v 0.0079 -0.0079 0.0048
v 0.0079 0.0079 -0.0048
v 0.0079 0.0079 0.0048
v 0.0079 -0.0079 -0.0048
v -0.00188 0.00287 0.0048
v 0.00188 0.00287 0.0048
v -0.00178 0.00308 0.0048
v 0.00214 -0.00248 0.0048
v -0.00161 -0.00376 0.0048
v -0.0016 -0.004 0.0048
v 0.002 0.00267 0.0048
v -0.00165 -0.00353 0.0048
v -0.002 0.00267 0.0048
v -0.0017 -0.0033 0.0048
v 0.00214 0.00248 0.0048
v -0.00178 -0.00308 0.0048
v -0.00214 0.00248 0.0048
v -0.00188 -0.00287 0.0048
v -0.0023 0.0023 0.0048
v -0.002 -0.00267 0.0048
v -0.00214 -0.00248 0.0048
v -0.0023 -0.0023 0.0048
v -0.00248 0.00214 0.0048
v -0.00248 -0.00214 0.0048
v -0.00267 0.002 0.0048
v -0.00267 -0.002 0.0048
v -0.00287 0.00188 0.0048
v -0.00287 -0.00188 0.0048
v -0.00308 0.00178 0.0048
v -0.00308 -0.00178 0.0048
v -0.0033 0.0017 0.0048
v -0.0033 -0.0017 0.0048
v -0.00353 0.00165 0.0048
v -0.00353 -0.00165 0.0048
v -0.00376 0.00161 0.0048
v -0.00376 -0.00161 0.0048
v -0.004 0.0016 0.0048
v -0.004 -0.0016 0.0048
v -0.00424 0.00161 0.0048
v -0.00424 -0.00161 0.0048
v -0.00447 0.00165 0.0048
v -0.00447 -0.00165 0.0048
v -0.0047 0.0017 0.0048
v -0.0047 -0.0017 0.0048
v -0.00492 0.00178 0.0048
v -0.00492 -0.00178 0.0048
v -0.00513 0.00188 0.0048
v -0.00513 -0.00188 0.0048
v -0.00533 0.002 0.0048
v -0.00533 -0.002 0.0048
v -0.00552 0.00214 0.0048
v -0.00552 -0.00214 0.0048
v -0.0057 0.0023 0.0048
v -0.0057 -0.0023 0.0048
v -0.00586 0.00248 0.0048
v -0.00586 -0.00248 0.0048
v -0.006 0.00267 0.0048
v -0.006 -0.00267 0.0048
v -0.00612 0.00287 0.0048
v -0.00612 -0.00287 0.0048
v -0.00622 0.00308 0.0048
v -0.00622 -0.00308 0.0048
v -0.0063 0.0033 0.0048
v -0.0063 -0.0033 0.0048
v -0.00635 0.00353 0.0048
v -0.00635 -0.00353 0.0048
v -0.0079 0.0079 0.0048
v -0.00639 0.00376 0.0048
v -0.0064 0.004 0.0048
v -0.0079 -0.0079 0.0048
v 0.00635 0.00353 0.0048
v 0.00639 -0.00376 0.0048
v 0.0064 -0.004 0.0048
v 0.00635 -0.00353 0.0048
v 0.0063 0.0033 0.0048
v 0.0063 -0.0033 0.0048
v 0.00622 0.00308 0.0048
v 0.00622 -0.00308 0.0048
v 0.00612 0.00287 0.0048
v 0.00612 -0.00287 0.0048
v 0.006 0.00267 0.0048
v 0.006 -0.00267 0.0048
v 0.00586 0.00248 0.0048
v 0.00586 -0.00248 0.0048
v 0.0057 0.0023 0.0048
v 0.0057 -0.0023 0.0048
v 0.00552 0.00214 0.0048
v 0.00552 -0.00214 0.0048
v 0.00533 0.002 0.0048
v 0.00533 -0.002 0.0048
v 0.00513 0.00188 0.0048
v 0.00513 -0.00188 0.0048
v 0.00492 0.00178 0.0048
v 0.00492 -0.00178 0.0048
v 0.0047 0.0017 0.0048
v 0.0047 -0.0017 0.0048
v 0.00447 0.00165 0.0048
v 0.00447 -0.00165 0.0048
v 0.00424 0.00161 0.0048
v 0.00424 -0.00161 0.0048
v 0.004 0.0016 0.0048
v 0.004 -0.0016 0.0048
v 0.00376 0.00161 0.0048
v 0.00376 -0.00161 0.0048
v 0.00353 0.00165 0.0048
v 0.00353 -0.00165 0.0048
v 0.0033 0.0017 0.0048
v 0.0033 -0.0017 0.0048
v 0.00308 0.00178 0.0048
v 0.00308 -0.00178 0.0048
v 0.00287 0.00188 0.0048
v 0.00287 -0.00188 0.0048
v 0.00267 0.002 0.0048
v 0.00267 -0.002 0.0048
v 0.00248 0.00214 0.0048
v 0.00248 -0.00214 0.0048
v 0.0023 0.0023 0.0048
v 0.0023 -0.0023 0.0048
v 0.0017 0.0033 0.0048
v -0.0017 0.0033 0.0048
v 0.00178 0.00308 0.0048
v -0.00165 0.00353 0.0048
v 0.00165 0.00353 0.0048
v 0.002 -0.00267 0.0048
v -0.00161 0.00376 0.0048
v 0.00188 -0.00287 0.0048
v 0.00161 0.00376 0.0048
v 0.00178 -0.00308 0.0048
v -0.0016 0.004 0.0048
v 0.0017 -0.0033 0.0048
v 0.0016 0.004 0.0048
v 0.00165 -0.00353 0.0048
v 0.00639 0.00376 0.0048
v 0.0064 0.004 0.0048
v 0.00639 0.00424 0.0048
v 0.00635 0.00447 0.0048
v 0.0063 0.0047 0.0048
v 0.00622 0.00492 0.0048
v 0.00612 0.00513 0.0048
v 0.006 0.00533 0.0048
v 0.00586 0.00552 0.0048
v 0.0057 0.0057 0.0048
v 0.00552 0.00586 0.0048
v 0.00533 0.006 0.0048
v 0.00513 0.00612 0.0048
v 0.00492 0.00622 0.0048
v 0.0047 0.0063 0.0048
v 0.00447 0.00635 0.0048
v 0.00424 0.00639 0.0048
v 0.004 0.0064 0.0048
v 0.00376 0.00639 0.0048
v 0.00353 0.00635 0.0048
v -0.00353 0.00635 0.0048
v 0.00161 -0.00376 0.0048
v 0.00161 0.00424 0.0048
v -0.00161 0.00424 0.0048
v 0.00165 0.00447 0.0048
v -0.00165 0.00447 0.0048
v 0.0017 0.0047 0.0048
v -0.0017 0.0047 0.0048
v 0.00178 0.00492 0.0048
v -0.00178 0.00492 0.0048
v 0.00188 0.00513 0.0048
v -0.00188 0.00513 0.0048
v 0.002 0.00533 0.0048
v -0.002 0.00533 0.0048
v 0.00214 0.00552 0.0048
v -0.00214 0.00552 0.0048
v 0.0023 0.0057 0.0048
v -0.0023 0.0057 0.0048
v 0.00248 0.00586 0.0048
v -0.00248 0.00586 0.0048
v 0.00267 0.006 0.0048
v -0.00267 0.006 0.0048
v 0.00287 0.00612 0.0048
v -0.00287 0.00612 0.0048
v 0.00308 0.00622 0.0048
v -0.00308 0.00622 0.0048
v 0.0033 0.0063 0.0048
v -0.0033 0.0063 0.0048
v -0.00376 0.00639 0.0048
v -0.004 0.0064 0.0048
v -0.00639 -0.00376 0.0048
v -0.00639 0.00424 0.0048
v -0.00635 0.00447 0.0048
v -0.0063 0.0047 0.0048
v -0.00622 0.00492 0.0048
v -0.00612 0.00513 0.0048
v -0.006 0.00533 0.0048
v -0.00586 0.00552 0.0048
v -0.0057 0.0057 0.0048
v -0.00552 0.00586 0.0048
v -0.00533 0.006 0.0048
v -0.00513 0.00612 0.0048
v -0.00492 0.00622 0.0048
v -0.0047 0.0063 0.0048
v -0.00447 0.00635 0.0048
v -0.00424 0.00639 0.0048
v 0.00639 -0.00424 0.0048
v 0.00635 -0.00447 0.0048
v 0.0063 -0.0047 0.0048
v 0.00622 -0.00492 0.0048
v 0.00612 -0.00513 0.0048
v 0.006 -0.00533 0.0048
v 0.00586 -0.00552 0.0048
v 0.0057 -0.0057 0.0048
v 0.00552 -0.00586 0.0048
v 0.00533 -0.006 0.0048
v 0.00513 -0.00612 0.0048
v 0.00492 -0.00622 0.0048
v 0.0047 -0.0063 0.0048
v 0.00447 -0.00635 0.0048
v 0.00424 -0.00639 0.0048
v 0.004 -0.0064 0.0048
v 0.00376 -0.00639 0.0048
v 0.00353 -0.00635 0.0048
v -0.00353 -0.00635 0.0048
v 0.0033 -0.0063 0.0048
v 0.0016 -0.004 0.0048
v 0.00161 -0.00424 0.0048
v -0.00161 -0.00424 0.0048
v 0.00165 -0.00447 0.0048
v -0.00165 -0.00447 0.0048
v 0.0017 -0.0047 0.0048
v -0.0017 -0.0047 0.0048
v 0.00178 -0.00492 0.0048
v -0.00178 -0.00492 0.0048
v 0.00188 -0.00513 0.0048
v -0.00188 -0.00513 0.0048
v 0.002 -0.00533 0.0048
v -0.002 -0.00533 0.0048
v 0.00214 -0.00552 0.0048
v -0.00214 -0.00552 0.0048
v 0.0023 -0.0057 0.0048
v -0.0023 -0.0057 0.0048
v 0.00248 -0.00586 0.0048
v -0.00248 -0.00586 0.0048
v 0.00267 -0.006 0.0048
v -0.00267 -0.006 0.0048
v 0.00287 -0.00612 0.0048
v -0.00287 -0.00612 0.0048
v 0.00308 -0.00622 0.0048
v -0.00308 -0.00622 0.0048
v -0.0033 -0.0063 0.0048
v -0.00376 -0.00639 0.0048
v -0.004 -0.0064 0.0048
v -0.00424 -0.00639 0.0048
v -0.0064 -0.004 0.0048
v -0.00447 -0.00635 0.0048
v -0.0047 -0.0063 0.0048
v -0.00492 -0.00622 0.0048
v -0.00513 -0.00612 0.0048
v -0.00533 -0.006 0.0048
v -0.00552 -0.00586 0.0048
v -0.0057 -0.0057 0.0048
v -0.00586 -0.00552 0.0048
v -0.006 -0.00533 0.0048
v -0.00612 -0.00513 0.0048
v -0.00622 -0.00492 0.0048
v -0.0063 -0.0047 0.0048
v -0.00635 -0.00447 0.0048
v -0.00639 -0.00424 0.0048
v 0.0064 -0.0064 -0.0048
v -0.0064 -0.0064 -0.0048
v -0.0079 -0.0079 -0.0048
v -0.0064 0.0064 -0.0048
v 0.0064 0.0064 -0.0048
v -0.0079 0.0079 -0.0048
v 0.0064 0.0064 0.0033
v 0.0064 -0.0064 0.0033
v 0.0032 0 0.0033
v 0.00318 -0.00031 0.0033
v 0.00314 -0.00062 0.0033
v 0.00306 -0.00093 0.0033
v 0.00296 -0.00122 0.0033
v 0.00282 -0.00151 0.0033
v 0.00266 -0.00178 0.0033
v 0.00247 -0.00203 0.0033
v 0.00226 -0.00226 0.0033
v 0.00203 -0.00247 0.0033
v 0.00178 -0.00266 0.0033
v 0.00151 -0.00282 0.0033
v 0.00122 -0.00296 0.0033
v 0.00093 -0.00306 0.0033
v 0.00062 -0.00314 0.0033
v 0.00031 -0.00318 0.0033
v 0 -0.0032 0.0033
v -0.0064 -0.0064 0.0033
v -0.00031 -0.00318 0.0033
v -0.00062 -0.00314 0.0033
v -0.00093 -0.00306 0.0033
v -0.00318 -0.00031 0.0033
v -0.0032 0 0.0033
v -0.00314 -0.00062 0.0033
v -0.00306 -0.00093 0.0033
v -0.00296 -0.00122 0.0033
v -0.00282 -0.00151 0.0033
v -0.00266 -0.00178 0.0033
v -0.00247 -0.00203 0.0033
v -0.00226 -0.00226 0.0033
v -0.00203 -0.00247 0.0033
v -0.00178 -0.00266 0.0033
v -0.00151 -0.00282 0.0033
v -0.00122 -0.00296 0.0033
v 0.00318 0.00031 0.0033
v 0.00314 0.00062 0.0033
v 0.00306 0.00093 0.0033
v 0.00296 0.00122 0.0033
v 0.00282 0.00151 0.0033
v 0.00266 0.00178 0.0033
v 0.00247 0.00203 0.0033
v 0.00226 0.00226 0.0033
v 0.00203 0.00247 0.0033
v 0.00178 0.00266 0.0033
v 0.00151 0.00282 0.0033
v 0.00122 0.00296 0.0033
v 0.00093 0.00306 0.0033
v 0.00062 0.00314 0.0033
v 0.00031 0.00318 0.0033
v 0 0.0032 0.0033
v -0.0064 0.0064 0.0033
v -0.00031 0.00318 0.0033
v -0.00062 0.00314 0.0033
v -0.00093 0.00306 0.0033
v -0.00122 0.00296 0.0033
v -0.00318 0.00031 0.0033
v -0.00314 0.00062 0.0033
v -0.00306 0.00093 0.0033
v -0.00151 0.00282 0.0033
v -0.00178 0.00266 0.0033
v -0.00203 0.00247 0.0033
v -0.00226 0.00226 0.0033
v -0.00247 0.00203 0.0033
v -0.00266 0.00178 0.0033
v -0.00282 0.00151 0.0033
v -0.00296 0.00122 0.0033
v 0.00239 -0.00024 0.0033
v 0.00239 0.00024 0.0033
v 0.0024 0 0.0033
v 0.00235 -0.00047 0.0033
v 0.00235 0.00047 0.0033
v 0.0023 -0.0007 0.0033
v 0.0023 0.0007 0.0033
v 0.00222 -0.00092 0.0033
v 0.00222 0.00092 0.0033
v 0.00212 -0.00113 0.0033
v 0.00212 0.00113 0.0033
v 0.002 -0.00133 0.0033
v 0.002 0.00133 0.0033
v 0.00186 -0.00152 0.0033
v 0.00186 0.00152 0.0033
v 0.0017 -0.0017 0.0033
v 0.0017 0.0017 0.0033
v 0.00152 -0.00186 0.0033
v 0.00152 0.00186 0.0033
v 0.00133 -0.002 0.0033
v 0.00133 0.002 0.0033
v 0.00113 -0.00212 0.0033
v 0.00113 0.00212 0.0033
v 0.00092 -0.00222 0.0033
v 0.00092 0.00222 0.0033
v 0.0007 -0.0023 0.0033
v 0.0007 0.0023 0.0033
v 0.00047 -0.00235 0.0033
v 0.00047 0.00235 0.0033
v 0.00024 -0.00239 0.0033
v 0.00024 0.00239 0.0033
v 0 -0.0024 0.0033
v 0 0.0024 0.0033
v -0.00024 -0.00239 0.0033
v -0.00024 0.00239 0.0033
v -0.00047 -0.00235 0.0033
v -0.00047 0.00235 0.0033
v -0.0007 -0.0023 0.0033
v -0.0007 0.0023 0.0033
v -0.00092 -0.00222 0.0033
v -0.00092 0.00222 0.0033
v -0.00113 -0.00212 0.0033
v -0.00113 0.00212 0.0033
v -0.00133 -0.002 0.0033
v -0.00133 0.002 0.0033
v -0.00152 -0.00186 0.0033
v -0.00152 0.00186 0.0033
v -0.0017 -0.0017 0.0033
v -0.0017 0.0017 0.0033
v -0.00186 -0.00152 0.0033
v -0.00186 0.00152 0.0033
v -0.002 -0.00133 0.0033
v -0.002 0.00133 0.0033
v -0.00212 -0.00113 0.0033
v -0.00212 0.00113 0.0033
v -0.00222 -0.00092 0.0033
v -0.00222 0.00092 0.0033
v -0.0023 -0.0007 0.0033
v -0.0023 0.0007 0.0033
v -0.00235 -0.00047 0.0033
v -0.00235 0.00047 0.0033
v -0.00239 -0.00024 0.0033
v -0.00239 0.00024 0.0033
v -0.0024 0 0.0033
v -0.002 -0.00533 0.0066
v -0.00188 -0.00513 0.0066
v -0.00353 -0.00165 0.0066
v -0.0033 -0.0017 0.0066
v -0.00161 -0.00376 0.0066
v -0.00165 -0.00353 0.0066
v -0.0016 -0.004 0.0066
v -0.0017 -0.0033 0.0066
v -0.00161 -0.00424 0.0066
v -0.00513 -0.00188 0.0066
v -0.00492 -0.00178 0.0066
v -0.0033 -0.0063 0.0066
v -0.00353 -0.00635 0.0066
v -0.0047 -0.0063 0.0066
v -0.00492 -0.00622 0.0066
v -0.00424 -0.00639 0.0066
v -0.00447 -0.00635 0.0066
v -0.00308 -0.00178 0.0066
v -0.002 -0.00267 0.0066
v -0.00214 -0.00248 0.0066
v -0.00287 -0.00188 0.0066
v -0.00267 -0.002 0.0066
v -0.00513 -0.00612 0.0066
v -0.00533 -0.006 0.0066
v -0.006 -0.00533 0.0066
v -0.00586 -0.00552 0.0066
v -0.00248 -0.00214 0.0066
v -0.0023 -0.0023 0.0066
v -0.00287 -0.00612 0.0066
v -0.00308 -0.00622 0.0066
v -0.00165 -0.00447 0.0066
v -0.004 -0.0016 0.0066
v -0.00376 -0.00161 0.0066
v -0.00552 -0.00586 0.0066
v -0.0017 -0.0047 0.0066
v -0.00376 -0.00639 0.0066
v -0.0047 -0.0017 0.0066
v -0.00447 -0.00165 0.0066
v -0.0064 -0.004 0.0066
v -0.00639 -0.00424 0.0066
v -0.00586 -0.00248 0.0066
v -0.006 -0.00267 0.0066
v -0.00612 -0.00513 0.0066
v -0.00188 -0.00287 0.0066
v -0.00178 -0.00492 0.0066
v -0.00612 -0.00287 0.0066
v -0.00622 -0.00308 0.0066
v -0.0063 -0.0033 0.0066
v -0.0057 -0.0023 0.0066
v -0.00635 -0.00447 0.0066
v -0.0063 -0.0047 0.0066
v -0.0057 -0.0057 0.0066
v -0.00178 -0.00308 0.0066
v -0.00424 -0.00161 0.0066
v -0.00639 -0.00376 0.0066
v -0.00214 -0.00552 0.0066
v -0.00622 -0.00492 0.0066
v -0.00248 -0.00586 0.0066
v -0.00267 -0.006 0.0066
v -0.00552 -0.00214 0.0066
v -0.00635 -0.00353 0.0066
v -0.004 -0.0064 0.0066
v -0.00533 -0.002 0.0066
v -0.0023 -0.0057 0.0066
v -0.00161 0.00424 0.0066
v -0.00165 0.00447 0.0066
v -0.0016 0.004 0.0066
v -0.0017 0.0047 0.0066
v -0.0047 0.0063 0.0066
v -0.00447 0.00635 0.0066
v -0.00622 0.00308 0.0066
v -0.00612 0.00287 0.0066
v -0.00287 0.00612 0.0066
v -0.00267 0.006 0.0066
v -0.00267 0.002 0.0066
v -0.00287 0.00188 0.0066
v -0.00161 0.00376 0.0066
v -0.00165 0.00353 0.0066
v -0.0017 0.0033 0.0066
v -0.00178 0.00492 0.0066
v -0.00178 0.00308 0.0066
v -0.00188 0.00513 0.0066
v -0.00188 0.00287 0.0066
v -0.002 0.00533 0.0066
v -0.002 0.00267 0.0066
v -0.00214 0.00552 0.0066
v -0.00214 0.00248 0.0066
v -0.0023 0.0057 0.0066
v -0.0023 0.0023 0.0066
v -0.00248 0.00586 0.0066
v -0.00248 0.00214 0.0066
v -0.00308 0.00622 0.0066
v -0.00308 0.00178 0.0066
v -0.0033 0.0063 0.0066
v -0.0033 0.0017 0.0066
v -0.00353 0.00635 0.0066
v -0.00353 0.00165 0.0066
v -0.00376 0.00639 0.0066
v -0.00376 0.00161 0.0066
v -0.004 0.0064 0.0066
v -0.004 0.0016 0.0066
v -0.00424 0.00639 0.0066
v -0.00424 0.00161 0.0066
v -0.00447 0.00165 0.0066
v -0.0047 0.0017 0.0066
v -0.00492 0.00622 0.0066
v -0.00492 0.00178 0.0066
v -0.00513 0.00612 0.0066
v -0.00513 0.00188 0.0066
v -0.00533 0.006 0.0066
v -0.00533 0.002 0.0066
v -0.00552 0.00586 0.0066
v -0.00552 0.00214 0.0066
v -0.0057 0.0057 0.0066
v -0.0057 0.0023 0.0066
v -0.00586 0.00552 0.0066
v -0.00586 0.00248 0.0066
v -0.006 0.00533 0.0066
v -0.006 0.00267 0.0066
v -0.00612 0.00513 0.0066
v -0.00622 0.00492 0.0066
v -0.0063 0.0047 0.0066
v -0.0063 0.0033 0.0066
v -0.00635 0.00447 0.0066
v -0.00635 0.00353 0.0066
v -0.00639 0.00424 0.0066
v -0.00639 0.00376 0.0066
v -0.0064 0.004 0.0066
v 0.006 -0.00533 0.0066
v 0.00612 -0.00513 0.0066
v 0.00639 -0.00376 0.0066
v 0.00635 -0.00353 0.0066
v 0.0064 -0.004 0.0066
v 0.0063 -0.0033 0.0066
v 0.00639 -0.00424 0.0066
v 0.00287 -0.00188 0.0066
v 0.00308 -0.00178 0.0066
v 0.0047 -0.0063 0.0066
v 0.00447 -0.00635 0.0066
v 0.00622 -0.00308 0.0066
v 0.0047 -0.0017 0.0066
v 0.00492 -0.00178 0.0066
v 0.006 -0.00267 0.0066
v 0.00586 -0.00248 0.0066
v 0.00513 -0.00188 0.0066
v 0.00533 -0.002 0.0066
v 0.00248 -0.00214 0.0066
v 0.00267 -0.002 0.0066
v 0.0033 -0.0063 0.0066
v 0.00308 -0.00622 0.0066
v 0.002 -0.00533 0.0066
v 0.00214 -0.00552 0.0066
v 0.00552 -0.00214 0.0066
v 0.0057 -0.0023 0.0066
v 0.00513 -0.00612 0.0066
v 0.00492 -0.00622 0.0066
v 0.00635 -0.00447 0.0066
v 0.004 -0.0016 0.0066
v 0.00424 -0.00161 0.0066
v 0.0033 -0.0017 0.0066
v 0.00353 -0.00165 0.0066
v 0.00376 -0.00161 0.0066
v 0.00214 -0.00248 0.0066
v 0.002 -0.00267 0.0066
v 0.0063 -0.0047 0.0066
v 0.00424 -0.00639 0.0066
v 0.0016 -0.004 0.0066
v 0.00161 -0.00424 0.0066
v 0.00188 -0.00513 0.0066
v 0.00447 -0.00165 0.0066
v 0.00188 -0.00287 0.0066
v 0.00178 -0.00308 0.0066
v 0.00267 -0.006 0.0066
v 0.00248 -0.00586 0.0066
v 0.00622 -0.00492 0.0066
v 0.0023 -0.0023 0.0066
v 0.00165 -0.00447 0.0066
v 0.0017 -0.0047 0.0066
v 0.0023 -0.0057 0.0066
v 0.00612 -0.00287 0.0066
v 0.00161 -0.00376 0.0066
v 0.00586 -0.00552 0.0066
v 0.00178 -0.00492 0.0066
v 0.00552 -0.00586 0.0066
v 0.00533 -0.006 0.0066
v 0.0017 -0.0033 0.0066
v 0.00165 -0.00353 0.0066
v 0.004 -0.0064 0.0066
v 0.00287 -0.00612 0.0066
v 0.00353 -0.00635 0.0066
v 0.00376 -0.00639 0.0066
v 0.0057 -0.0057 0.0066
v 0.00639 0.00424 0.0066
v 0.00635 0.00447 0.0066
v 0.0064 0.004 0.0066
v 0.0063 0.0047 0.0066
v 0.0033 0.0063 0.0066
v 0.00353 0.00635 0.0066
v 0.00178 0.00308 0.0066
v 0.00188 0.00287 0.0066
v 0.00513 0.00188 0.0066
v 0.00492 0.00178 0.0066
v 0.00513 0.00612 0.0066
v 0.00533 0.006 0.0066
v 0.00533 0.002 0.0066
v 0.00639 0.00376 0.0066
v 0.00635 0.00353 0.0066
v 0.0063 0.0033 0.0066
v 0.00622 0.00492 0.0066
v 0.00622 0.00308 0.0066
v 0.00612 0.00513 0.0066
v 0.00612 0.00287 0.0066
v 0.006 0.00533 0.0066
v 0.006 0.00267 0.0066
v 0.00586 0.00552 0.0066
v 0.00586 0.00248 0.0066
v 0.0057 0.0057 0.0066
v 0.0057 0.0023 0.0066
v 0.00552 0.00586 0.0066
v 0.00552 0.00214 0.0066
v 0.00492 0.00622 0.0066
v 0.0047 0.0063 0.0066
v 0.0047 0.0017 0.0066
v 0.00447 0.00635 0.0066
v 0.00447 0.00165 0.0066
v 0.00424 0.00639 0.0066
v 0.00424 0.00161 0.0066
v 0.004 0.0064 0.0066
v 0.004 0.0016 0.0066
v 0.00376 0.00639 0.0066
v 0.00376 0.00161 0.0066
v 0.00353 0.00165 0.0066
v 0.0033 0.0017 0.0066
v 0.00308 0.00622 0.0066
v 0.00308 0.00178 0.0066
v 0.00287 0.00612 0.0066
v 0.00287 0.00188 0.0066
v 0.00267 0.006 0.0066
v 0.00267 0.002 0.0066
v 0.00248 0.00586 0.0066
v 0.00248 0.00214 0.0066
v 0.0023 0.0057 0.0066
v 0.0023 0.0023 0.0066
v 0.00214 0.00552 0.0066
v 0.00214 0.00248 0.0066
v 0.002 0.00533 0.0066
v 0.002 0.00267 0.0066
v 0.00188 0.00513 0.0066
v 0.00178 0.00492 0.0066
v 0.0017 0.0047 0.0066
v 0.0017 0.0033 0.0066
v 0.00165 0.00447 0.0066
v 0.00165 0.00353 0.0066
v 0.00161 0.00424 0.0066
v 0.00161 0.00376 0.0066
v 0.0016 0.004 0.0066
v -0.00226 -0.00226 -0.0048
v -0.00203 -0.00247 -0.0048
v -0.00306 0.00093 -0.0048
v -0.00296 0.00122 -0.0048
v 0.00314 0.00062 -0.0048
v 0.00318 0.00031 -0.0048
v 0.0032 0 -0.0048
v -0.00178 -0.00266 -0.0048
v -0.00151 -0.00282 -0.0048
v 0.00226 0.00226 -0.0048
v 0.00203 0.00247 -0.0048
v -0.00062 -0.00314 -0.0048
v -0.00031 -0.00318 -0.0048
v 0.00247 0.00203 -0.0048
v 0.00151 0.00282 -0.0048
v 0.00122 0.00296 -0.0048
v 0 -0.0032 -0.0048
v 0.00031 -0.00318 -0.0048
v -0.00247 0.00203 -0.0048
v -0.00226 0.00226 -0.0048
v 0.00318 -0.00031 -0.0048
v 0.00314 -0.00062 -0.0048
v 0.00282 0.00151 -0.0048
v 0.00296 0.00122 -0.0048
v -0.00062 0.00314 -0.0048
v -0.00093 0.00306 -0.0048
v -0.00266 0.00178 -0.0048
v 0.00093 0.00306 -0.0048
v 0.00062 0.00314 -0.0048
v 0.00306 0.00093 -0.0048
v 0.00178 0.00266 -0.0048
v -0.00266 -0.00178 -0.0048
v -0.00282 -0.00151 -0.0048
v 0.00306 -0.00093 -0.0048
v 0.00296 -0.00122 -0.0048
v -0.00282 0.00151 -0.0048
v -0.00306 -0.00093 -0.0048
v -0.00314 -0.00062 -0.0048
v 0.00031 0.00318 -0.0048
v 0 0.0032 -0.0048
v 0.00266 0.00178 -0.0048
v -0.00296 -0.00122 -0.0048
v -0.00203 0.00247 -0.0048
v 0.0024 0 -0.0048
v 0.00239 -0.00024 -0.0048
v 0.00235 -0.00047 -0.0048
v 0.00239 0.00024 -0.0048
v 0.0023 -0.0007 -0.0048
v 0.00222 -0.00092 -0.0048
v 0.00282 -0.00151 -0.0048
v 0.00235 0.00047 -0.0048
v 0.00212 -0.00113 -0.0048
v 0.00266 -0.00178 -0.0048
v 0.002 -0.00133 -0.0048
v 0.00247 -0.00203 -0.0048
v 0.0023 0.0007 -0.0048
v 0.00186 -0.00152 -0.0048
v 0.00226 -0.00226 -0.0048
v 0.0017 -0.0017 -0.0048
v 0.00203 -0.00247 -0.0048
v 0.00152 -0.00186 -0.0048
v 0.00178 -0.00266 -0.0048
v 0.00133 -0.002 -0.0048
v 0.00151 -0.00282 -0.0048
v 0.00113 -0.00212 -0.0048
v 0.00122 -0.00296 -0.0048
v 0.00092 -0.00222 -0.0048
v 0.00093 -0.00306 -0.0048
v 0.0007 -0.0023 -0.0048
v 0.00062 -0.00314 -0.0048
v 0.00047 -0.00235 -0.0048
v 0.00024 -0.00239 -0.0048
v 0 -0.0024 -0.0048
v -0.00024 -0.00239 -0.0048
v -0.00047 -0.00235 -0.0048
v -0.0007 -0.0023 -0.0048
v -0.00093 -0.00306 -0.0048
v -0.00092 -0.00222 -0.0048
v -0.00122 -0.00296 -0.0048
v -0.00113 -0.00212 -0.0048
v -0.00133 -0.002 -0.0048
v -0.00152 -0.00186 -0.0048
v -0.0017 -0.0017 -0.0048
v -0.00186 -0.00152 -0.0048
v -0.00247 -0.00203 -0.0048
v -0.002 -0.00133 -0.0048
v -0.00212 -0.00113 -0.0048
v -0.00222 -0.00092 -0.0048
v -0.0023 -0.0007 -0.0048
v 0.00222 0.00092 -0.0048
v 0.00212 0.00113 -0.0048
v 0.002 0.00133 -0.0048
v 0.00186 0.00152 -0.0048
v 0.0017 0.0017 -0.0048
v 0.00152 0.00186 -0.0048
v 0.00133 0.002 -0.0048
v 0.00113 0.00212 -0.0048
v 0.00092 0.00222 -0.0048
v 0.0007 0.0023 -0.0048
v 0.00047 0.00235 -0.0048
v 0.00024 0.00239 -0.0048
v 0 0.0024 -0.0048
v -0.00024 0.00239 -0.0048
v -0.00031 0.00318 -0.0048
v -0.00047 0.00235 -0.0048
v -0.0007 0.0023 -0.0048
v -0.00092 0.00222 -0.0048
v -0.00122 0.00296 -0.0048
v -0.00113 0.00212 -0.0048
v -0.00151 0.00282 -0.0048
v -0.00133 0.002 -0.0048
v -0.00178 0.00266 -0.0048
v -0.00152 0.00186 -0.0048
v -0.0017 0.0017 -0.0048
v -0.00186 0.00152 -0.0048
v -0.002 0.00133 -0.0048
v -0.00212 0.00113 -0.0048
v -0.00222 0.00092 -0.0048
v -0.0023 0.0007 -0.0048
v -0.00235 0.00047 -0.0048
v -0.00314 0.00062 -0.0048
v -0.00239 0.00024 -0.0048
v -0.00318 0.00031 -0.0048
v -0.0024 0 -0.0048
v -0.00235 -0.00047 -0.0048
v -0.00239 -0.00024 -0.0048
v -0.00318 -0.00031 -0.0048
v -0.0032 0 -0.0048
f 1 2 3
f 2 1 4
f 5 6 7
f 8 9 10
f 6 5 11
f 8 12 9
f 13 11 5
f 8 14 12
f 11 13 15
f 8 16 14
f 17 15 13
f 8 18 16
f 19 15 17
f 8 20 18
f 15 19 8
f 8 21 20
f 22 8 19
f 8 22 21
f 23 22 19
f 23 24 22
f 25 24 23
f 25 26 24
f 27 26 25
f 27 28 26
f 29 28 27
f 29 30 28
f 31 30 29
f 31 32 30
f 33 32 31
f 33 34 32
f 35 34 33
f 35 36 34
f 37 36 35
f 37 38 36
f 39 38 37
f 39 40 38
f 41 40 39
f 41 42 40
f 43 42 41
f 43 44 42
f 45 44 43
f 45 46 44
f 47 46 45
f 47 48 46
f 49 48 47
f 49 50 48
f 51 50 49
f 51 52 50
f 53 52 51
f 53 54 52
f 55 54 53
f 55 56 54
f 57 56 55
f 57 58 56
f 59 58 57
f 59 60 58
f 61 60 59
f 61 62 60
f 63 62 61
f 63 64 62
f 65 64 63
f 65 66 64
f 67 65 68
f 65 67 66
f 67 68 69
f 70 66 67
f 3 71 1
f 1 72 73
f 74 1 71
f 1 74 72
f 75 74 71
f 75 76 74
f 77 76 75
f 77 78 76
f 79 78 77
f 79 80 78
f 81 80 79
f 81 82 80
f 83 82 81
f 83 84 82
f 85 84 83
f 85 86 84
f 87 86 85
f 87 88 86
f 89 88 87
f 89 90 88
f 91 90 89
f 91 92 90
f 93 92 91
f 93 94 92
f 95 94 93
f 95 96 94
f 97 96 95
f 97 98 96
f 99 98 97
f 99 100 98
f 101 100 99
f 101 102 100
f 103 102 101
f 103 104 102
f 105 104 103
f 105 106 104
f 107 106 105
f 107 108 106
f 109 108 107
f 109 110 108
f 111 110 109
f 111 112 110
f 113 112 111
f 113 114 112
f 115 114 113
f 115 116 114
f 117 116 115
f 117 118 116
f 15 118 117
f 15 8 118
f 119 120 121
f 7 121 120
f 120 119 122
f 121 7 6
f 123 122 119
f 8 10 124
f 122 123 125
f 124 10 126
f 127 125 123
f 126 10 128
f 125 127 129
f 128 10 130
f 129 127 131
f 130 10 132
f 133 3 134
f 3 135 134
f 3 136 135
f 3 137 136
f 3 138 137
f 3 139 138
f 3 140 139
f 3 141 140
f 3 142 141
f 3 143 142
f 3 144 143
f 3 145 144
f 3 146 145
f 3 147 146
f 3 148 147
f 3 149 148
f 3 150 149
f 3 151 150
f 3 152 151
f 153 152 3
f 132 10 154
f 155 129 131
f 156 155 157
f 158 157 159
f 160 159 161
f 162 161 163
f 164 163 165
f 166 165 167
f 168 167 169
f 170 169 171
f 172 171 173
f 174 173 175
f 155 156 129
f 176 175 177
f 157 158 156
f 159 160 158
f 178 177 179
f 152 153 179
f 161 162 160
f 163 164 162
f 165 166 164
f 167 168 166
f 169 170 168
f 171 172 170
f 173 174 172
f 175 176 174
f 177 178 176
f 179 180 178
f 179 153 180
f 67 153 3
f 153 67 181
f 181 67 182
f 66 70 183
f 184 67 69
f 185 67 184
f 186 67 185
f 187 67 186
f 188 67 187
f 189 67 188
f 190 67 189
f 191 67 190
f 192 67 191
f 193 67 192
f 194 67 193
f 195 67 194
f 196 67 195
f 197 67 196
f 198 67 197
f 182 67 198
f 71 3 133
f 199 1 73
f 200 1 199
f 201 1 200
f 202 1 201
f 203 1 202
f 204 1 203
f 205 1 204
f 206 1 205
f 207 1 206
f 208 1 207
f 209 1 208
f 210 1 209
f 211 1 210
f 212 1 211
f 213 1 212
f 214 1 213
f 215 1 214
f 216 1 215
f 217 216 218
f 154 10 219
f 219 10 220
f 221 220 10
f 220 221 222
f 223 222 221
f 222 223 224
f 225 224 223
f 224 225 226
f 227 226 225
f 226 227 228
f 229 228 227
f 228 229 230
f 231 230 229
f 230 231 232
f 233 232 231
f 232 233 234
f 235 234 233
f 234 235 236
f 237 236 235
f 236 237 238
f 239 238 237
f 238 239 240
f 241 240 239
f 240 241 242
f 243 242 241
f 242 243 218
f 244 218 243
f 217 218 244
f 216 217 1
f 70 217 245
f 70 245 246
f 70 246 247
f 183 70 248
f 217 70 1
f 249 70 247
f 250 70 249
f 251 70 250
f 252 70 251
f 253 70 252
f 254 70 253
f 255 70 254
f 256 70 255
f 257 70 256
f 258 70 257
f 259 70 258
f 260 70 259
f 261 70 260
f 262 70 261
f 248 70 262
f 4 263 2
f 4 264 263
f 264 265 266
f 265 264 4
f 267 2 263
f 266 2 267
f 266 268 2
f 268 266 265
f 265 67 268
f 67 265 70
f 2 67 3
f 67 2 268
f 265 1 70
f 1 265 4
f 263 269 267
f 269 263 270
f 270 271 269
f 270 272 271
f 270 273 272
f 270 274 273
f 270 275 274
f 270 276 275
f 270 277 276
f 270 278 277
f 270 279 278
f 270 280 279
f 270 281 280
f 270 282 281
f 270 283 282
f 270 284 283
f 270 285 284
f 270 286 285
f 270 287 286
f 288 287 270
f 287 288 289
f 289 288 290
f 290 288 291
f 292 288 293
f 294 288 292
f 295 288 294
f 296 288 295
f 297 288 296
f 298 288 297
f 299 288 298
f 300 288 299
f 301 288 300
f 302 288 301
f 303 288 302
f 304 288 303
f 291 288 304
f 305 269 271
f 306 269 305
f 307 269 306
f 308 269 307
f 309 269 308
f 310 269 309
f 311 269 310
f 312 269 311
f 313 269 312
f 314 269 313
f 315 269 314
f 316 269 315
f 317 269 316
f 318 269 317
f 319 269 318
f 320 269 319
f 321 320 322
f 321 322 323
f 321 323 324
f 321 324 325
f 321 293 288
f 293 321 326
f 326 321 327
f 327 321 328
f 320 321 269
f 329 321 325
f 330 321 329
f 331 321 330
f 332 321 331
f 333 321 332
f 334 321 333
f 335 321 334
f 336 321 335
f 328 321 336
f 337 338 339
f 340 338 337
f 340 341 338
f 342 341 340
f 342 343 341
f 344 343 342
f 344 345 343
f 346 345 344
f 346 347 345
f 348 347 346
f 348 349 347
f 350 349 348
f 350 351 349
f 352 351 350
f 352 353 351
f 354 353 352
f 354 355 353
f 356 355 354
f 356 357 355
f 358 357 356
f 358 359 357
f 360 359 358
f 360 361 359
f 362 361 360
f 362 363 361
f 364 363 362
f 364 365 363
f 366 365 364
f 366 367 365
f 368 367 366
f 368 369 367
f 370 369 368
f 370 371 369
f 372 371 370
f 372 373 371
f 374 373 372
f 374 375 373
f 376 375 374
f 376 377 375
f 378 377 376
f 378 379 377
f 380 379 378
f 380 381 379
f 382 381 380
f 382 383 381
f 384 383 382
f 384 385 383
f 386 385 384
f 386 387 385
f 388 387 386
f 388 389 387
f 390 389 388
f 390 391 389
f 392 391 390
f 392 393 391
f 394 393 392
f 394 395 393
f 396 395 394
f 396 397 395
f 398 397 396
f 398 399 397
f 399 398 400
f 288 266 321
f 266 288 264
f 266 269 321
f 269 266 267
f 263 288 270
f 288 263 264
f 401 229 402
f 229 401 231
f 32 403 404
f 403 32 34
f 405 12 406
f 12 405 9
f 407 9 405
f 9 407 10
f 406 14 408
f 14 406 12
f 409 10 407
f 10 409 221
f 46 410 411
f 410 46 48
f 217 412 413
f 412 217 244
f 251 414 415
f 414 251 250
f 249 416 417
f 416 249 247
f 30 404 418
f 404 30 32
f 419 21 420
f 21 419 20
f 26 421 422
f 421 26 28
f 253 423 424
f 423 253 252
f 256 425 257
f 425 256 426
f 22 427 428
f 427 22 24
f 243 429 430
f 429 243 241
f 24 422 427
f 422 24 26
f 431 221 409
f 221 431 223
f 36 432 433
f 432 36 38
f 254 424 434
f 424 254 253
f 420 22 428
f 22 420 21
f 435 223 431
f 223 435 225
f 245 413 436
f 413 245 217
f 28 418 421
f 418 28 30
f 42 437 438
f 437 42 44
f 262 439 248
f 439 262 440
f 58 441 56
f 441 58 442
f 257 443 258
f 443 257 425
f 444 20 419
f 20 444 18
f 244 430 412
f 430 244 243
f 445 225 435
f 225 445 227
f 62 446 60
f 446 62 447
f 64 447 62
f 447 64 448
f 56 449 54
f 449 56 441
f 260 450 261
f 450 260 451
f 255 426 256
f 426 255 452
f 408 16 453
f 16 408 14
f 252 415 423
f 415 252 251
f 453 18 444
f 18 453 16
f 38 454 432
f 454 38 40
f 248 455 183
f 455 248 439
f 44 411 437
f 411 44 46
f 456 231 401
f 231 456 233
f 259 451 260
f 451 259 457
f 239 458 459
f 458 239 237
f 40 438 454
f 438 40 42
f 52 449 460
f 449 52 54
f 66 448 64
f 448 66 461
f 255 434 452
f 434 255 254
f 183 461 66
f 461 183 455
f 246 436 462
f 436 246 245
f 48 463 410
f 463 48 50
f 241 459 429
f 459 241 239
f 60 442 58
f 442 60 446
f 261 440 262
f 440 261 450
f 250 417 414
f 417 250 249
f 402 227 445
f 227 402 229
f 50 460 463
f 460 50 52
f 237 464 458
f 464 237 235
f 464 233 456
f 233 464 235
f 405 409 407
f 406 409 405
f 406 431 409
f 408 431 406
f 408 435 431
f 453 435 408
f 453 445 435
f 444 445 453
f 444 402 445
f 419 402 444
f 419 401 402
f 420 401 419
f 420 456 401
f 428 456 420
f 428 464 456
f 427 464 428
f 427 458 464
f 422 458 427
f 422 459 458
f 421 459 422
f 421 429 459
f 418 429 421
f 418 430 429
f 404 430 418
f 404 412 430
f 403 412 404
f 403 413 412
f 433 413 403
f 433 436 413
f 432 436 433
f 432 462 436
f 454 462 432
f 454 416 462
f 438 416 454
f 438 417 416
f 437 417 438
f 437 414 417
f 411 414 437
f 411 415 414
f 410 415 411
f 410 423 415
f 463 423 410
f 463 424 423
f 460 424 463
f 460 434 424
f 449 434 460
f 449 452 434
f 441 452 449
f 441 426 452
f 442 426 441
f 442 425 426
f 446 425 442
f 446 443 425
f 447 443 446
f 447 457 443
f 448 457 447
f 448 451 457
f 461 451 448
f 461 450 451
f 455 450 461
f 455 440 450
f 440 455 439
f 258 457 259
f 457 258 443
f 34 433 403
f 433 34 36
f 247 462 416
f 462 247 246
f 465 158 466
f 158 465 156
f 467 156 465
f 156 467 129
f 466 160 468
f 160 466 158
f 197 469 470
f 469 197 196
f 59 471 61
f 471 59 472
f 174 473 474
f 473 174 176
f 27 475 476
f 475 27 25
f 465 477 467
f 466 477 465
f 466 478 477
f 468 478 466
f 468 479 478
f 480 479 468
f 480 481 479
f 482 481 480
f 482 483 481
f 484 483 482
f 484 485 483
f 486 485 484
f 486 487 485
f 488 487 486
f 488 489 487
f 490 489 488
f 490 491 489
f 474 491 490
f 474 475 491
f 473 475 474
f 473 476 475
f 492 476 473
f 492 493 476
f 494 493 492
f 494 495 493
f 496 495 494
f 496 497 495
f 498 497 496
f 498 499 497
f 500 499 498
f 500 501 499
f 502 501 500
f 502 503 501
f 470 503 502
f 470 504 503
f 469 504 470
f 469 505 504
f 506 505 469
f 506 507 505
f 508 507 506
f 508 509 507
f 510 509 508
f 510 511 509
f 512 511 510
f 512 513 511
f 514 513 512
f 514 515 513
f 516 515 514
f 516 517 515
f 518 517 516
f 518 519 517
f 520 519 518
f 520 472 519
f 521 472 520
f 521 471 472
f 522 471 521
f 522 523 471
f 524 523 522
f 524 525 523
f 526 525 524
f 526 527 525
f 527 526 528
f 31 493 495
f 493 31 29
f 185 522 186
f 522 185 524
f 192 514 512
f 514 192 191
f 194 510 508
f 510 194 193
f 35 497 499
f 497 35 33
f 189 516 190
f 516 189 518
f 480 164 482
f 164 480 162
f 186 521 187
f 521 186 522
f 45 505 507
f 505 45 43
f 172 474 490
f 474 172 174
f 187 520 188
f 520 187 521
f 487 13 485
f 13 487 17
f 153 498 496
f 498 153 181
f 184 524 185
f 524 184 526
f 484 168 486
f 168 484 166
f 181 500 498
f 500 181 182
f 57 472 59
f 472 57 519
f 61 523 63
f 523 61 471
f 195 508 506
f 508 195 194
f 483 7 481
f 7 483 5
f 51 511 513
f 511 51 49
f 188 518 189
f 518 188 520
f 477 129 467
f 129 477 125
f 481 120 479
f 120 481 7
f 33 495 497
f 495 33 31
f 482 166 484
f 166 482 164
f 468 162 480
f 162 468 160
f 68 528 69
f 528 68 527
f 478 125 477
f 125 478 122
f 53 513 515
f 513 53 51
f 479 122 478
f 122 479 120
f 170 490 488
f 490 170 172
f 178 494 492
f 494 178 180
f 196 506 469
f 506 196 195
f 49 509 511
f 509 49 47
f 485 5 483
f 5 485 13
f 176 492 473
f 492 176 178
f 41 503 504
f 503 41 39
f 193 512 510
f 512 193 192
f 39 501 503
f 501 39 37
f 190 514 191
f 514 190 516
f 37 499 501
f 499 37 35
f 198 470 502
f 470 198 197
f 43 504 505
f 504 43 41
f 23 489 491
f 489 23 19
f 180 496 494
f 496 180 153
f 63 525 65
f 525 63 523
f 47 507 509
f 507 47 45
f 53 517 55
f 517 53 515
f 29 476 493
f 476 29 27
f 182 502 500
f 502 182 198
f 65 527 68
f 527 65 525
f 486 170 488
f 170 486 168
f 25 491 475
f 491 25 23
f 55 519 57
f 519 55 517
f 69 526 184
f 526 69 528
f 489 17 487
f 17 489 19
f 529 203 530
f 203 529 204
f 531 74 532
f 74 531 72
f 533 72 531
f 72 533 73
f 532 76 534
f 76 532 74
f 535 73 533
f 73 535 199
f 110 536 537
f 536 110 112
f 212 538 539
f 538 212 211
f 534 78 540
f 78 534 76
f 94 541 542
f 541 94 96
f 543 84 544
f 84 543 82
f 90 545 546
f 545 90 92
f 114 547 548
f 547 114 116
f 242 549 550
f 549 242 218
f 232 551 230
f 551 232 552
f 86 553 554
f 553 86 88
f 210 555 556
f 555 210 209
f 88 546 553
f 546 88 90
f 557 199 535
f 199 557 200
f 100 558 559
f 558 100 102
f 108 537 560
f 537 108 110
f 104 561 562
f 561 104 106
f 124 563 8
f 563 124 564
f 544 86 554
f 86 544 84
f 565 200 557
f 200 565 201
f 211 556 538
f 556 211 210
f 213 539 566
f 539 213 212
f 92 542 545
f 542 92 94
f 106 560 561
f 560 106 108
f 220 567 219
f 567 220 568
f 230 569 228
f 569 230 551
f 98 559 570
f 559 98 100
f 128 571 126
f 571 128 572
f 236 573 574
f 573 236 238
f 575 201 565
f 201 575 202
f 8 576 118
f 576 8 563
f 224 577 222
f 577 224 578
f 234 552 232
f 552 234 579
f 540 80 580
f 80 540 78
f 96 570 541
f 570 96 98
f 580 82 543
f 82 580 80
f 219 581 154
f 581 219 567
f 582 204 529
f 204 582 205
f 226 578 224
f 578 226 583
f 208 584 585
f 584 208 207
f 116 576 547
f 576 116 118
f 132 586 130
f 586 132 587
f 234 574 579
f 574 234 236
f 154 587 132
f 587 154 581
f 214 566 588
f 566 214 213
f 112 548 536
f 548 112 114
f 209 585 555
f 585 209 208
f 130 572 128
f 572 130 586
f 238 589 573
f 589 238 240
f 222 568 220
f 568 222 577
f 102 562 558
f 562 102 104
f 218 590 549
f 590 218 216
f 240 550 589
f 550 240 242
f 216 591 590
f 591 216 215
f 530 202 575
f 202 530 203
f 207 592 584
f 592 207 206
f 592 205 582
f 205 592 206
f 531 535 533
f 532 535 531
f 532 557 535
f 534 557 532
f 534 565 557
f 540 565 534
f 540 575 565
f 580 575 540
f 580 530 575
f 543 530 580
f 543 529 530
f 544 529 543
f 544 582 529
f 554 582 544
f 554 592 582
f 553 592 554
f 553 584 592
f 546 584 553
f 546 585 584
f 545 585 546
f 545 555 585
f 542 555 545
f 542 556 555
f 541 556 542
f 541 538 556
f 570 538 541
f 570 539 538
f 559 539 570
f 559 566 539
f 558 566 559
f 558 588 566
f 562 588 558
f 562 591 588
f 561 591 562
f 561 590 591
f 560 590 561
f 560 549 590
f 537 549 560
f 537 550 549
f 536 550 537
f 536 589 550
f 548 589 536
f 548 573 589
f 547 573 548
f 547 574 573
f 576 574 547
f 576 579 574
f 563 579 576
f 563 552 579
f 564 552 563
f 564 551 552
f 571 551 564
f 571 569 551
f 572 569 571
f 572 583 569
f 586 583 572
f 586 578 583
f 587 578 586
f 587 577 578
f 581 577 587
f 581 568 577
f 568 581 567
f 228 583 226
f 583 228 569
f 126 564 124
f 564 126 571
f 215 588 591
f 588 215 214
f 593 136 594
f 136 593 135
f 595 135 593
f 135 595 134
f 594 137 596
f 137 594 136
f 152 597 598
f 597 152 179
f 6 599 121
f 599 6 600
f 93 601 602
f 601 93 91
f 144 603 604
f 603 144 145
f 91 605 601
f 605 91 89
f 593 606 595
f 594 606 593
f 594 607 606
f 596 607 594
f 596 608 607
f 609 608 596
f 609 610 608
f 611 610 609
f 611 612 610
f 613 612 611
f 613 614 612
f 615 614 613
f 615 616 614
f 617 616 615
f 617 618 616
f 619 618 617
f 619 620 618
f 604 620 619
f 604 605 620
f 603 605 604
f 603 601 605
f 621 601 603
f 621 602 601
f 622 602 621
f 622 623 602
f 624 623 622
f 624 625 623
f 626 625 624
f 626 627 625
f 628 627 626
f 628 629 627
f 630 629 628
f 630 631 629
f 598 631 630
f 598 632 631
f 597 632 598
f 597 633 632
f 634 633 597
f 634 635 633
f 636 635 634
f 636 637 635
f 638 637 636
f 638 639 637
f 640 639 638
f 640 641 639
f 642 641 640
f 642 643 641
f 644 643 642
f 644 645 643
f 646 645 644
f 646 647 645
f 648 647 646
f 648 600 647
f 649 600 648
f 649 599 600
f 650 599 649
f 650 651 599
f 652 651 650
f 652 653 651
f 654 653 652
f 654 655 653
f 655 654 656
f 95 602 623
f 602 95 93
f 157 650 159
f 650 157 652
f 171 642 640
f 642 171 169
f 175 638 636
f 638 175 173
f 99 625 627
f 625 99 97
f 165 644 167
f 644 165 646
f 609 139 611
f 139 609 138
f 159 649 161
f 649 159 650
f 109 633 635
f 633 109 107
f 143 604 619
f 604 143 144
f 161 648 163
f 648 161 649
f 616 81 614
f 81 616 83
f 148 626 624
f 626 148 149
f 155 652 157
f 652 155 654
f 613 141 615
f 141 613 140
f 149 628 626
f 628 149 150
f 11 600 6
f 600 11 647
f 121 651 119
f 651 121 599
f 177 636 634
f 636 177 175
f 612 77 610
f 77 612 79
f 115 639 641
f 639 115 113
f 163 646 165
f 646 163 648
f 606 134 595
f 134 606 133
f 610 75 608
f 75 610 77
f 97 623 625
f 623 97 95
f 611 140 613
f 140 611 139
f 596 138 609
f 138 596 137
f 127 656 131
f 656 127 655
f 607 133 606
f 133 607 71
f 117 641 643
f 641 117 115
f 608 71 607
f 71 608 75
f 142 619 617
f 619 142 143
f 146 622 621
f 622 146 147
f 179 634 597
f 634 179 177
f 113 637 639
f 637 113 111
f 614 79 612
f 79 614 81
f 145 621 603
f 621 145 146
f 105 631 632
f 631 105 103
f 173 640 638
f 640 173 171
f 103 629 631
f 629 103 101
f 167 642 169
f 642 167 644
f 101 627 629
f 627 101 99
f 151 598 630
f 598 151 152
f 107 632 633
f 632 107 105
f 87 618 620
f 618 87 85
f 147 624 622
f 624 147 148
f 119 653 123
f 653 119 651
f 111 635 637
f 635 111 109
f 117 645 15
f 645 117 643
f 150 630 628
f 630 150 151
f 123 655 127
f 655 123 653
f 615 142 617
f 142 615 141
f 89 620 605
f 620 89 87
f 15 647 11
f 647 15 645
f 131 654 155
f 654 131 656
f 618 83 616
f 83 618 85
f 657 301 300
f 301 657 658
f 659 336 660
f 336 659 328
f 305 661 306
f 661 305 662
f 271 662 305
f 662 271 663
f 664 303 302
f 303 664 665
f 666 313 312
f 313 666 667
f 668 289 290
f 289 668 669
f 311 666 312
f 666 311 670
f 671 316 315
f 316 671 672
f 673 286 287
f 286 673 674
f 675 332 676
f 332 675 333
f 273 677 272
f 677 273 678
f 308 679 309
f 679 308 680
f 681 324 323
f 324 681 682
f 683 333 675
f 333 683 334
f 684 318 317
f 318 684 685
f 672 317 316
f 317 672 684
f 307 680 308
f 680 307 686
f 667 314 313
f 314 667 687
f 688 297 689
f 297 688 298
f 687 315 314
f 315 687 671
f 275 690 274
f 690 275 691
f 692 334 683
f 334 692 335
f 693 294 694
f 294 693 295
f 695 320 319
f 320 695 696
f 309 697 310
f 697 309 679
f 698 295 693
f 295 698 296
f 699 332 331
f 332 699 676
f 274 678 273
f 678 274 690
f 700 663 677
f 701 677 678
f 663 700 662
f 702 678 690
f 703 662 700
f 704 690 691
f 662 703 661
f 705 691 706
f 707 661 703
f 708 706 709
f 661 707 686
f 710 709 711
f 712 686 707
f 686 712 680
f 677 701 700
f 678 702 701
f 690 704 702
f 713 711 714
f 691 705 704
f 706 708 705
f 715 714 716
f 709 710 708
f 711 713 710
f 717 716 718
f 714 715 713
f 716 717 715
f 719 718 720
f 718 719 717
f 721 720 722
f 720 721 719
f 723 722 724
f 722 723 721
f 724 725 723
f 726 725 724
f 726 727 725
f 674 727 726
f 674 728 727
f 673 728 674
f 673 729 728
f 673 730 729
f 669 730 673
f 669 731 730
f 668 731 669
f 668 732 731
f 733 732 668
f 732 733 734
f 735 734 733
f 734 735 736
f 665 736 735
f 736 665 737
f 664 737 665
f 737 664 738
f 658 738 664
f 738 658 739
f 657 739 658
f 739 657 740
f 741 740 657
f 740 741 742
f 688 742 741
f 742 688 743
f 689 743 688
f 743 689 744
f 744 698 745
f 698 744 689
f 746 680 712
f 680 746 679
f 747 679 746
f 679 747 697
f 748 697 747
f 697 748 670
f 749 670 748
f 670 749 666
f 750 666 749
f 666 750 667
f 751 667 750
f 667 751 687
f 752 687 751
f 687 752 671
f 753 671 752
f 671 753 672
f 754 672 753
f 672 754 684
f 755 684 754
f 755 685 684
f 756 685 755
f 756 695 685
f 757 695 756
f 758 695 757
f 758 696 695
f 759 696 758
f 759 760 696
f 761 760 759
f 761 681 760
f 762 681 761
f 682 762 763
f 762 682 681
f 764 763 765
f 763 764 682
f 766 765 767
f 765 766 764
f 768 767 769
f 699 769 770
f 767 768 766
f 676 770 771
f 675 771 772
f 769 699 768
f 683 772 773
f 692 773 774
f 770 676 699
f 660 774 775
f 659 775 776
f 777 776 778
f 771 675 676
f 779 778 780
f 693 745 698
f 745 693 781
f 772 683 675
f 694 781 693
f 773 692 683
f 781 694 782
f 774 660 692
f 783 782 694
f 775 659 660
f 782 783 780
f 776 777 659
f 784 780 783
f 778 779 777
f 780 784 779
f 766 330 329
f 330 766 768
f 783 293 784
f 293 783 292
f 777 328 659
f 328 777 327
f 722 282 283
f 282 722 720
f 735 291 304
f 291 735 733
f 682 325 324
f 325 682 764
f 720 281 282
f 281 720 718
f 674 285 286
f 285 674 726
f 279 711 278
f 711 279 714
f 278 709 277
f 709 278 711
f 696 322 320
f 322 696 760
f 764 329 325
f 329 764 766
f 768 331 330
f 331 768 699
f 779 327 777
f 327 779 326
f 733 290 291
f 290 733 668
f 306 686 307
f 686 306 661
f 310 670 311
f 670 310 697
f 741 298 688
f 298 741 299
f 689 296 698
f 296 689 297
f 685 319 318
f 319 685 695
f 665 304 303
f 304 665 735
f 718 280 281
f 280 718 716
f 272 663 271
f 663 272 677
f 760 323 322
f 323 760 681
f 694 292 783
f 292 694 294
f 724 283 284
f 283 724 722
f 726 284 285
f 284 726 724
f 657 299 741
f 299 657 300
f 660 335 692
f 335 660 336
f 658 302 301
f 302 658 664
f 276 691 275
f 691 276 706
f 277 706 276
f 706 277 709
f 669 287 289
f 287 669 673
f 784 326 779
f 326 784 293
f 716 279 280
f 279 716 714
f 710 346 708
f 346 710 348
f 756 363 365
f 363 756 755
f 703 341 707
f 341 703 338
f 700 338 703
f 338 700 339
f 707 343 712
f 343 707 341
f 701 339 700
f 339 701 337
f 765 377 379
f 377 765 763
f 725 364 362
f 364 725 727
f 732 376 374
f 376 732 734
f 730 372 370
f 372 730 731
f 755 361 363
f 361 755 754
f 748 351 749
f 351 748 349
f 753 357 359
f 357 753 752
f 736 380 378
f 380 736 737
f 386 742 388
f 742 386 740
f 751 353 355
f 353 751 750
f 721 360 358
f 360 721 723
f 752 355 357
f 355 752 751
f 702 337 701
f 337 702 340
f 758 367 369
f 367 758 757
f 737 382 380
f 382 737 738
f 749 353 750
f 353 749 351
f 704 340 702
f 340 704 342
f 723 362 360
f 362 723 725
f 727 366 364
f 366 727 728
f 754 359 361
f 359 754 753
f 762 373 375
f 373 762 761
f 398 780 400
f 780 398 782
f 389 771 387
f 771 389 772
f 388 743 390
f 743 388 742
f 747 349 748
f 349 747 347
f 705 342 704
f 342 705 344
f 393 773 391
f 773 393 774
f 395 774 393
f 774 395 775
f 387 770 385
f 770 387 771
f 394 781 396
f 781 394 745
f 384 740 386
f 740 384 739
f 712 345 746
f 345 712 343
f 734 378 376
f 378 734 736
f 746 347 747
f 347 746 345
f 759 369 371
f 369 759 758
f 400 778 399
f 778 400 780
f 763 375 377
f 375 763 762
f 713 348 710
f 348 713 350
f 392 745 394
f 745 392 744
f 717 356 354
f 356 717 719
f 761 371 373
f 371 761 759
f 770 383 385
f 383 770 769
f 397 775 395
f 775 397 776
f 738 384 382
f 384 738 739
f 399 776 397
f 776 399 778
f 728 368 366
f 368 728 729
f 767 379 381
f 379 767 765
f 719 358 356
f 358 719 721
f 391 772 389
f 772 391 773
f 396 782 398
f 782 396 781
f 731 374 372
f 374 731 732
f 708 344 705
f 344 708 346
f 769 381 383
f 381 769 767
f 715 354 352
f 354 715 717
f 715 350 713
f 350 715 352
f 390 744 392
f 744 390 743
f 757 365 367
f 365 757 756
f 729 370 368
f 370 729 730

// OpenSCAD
// Oneirifact graph source-first OpenSCAD emission (R96)
// source revision: sha256:7ffd0f316da4bb467f7dea06d593933caac874483a799015a96f592cf5a2888f
// SCAD units: meters, Z-up; $fn is tessellation only
module of_f0() {
  cube([0.15800000000000003, 0.15800000000000003, 0.095999999999999988], center=true);
}
module of_f1() {
  cube([0.12800000000000003, 0.12800000000000003, 0.084999999999999992], center=true);
}
module of_f2() {
  translate([0, 0, -0.0094999999999999998]) of_f1();
}
module of_f3() {
  difference() { of_f0(); of_f2(); }
}
module of_f4() {
  cylinder(h=0.02, r=0.023999999999999997, center=true, $fn=64);
}
module of_f5() {
  translate([-0.040000000000000001, -0.040000000000000001, 0.056000000000000001]) of_f4();
}
module of_f6() {
  union() { of_f3(); of_f5(); }
}
module of_f7() {
  translate([-0.040000000000000001, 0.040000000000000001, 0.056000000000000001]) of_f4();
}
module of_f8() {
  union() { of_f6(); of_f7(); }
}
module of_f9() {
  translate([0.040000000000000001, -0.040000000000000001, 0.056000000000000001]) of_f4();
}
module of_f10() {
  union() { of_f8(); of_f9(); }
}
module of_f11() {
  translate([0.040000000000000001, 0.040000000000000001, 0.056000000000000001]) of_f4();
}
module of_f12() {
  union() { of_f10(); of_f11(); }
}
module of_f13() {
  cylinder(h=0.083000000000000004, r=0.032000000000000001, center=true, $fn=64);
}
module of_f14() {
  cylinder(h=0.086999999999999994, r=0.023999999999999997, center=true, $fn=64);
}
module of_f15() {
  difference() { of_f13(); of_f14(); }
}
module of_f16() {
  translate([0, 0, -0.0064999999999999997]) of_f15();
}
module of_f17() {
  union() { of_f12(); of_f16(); }
}
module of_f18() {
  scale([0.10000000000000001, 0.10000000000000001, 0.10000000000000001]) of_f17();
}
of_f18();
